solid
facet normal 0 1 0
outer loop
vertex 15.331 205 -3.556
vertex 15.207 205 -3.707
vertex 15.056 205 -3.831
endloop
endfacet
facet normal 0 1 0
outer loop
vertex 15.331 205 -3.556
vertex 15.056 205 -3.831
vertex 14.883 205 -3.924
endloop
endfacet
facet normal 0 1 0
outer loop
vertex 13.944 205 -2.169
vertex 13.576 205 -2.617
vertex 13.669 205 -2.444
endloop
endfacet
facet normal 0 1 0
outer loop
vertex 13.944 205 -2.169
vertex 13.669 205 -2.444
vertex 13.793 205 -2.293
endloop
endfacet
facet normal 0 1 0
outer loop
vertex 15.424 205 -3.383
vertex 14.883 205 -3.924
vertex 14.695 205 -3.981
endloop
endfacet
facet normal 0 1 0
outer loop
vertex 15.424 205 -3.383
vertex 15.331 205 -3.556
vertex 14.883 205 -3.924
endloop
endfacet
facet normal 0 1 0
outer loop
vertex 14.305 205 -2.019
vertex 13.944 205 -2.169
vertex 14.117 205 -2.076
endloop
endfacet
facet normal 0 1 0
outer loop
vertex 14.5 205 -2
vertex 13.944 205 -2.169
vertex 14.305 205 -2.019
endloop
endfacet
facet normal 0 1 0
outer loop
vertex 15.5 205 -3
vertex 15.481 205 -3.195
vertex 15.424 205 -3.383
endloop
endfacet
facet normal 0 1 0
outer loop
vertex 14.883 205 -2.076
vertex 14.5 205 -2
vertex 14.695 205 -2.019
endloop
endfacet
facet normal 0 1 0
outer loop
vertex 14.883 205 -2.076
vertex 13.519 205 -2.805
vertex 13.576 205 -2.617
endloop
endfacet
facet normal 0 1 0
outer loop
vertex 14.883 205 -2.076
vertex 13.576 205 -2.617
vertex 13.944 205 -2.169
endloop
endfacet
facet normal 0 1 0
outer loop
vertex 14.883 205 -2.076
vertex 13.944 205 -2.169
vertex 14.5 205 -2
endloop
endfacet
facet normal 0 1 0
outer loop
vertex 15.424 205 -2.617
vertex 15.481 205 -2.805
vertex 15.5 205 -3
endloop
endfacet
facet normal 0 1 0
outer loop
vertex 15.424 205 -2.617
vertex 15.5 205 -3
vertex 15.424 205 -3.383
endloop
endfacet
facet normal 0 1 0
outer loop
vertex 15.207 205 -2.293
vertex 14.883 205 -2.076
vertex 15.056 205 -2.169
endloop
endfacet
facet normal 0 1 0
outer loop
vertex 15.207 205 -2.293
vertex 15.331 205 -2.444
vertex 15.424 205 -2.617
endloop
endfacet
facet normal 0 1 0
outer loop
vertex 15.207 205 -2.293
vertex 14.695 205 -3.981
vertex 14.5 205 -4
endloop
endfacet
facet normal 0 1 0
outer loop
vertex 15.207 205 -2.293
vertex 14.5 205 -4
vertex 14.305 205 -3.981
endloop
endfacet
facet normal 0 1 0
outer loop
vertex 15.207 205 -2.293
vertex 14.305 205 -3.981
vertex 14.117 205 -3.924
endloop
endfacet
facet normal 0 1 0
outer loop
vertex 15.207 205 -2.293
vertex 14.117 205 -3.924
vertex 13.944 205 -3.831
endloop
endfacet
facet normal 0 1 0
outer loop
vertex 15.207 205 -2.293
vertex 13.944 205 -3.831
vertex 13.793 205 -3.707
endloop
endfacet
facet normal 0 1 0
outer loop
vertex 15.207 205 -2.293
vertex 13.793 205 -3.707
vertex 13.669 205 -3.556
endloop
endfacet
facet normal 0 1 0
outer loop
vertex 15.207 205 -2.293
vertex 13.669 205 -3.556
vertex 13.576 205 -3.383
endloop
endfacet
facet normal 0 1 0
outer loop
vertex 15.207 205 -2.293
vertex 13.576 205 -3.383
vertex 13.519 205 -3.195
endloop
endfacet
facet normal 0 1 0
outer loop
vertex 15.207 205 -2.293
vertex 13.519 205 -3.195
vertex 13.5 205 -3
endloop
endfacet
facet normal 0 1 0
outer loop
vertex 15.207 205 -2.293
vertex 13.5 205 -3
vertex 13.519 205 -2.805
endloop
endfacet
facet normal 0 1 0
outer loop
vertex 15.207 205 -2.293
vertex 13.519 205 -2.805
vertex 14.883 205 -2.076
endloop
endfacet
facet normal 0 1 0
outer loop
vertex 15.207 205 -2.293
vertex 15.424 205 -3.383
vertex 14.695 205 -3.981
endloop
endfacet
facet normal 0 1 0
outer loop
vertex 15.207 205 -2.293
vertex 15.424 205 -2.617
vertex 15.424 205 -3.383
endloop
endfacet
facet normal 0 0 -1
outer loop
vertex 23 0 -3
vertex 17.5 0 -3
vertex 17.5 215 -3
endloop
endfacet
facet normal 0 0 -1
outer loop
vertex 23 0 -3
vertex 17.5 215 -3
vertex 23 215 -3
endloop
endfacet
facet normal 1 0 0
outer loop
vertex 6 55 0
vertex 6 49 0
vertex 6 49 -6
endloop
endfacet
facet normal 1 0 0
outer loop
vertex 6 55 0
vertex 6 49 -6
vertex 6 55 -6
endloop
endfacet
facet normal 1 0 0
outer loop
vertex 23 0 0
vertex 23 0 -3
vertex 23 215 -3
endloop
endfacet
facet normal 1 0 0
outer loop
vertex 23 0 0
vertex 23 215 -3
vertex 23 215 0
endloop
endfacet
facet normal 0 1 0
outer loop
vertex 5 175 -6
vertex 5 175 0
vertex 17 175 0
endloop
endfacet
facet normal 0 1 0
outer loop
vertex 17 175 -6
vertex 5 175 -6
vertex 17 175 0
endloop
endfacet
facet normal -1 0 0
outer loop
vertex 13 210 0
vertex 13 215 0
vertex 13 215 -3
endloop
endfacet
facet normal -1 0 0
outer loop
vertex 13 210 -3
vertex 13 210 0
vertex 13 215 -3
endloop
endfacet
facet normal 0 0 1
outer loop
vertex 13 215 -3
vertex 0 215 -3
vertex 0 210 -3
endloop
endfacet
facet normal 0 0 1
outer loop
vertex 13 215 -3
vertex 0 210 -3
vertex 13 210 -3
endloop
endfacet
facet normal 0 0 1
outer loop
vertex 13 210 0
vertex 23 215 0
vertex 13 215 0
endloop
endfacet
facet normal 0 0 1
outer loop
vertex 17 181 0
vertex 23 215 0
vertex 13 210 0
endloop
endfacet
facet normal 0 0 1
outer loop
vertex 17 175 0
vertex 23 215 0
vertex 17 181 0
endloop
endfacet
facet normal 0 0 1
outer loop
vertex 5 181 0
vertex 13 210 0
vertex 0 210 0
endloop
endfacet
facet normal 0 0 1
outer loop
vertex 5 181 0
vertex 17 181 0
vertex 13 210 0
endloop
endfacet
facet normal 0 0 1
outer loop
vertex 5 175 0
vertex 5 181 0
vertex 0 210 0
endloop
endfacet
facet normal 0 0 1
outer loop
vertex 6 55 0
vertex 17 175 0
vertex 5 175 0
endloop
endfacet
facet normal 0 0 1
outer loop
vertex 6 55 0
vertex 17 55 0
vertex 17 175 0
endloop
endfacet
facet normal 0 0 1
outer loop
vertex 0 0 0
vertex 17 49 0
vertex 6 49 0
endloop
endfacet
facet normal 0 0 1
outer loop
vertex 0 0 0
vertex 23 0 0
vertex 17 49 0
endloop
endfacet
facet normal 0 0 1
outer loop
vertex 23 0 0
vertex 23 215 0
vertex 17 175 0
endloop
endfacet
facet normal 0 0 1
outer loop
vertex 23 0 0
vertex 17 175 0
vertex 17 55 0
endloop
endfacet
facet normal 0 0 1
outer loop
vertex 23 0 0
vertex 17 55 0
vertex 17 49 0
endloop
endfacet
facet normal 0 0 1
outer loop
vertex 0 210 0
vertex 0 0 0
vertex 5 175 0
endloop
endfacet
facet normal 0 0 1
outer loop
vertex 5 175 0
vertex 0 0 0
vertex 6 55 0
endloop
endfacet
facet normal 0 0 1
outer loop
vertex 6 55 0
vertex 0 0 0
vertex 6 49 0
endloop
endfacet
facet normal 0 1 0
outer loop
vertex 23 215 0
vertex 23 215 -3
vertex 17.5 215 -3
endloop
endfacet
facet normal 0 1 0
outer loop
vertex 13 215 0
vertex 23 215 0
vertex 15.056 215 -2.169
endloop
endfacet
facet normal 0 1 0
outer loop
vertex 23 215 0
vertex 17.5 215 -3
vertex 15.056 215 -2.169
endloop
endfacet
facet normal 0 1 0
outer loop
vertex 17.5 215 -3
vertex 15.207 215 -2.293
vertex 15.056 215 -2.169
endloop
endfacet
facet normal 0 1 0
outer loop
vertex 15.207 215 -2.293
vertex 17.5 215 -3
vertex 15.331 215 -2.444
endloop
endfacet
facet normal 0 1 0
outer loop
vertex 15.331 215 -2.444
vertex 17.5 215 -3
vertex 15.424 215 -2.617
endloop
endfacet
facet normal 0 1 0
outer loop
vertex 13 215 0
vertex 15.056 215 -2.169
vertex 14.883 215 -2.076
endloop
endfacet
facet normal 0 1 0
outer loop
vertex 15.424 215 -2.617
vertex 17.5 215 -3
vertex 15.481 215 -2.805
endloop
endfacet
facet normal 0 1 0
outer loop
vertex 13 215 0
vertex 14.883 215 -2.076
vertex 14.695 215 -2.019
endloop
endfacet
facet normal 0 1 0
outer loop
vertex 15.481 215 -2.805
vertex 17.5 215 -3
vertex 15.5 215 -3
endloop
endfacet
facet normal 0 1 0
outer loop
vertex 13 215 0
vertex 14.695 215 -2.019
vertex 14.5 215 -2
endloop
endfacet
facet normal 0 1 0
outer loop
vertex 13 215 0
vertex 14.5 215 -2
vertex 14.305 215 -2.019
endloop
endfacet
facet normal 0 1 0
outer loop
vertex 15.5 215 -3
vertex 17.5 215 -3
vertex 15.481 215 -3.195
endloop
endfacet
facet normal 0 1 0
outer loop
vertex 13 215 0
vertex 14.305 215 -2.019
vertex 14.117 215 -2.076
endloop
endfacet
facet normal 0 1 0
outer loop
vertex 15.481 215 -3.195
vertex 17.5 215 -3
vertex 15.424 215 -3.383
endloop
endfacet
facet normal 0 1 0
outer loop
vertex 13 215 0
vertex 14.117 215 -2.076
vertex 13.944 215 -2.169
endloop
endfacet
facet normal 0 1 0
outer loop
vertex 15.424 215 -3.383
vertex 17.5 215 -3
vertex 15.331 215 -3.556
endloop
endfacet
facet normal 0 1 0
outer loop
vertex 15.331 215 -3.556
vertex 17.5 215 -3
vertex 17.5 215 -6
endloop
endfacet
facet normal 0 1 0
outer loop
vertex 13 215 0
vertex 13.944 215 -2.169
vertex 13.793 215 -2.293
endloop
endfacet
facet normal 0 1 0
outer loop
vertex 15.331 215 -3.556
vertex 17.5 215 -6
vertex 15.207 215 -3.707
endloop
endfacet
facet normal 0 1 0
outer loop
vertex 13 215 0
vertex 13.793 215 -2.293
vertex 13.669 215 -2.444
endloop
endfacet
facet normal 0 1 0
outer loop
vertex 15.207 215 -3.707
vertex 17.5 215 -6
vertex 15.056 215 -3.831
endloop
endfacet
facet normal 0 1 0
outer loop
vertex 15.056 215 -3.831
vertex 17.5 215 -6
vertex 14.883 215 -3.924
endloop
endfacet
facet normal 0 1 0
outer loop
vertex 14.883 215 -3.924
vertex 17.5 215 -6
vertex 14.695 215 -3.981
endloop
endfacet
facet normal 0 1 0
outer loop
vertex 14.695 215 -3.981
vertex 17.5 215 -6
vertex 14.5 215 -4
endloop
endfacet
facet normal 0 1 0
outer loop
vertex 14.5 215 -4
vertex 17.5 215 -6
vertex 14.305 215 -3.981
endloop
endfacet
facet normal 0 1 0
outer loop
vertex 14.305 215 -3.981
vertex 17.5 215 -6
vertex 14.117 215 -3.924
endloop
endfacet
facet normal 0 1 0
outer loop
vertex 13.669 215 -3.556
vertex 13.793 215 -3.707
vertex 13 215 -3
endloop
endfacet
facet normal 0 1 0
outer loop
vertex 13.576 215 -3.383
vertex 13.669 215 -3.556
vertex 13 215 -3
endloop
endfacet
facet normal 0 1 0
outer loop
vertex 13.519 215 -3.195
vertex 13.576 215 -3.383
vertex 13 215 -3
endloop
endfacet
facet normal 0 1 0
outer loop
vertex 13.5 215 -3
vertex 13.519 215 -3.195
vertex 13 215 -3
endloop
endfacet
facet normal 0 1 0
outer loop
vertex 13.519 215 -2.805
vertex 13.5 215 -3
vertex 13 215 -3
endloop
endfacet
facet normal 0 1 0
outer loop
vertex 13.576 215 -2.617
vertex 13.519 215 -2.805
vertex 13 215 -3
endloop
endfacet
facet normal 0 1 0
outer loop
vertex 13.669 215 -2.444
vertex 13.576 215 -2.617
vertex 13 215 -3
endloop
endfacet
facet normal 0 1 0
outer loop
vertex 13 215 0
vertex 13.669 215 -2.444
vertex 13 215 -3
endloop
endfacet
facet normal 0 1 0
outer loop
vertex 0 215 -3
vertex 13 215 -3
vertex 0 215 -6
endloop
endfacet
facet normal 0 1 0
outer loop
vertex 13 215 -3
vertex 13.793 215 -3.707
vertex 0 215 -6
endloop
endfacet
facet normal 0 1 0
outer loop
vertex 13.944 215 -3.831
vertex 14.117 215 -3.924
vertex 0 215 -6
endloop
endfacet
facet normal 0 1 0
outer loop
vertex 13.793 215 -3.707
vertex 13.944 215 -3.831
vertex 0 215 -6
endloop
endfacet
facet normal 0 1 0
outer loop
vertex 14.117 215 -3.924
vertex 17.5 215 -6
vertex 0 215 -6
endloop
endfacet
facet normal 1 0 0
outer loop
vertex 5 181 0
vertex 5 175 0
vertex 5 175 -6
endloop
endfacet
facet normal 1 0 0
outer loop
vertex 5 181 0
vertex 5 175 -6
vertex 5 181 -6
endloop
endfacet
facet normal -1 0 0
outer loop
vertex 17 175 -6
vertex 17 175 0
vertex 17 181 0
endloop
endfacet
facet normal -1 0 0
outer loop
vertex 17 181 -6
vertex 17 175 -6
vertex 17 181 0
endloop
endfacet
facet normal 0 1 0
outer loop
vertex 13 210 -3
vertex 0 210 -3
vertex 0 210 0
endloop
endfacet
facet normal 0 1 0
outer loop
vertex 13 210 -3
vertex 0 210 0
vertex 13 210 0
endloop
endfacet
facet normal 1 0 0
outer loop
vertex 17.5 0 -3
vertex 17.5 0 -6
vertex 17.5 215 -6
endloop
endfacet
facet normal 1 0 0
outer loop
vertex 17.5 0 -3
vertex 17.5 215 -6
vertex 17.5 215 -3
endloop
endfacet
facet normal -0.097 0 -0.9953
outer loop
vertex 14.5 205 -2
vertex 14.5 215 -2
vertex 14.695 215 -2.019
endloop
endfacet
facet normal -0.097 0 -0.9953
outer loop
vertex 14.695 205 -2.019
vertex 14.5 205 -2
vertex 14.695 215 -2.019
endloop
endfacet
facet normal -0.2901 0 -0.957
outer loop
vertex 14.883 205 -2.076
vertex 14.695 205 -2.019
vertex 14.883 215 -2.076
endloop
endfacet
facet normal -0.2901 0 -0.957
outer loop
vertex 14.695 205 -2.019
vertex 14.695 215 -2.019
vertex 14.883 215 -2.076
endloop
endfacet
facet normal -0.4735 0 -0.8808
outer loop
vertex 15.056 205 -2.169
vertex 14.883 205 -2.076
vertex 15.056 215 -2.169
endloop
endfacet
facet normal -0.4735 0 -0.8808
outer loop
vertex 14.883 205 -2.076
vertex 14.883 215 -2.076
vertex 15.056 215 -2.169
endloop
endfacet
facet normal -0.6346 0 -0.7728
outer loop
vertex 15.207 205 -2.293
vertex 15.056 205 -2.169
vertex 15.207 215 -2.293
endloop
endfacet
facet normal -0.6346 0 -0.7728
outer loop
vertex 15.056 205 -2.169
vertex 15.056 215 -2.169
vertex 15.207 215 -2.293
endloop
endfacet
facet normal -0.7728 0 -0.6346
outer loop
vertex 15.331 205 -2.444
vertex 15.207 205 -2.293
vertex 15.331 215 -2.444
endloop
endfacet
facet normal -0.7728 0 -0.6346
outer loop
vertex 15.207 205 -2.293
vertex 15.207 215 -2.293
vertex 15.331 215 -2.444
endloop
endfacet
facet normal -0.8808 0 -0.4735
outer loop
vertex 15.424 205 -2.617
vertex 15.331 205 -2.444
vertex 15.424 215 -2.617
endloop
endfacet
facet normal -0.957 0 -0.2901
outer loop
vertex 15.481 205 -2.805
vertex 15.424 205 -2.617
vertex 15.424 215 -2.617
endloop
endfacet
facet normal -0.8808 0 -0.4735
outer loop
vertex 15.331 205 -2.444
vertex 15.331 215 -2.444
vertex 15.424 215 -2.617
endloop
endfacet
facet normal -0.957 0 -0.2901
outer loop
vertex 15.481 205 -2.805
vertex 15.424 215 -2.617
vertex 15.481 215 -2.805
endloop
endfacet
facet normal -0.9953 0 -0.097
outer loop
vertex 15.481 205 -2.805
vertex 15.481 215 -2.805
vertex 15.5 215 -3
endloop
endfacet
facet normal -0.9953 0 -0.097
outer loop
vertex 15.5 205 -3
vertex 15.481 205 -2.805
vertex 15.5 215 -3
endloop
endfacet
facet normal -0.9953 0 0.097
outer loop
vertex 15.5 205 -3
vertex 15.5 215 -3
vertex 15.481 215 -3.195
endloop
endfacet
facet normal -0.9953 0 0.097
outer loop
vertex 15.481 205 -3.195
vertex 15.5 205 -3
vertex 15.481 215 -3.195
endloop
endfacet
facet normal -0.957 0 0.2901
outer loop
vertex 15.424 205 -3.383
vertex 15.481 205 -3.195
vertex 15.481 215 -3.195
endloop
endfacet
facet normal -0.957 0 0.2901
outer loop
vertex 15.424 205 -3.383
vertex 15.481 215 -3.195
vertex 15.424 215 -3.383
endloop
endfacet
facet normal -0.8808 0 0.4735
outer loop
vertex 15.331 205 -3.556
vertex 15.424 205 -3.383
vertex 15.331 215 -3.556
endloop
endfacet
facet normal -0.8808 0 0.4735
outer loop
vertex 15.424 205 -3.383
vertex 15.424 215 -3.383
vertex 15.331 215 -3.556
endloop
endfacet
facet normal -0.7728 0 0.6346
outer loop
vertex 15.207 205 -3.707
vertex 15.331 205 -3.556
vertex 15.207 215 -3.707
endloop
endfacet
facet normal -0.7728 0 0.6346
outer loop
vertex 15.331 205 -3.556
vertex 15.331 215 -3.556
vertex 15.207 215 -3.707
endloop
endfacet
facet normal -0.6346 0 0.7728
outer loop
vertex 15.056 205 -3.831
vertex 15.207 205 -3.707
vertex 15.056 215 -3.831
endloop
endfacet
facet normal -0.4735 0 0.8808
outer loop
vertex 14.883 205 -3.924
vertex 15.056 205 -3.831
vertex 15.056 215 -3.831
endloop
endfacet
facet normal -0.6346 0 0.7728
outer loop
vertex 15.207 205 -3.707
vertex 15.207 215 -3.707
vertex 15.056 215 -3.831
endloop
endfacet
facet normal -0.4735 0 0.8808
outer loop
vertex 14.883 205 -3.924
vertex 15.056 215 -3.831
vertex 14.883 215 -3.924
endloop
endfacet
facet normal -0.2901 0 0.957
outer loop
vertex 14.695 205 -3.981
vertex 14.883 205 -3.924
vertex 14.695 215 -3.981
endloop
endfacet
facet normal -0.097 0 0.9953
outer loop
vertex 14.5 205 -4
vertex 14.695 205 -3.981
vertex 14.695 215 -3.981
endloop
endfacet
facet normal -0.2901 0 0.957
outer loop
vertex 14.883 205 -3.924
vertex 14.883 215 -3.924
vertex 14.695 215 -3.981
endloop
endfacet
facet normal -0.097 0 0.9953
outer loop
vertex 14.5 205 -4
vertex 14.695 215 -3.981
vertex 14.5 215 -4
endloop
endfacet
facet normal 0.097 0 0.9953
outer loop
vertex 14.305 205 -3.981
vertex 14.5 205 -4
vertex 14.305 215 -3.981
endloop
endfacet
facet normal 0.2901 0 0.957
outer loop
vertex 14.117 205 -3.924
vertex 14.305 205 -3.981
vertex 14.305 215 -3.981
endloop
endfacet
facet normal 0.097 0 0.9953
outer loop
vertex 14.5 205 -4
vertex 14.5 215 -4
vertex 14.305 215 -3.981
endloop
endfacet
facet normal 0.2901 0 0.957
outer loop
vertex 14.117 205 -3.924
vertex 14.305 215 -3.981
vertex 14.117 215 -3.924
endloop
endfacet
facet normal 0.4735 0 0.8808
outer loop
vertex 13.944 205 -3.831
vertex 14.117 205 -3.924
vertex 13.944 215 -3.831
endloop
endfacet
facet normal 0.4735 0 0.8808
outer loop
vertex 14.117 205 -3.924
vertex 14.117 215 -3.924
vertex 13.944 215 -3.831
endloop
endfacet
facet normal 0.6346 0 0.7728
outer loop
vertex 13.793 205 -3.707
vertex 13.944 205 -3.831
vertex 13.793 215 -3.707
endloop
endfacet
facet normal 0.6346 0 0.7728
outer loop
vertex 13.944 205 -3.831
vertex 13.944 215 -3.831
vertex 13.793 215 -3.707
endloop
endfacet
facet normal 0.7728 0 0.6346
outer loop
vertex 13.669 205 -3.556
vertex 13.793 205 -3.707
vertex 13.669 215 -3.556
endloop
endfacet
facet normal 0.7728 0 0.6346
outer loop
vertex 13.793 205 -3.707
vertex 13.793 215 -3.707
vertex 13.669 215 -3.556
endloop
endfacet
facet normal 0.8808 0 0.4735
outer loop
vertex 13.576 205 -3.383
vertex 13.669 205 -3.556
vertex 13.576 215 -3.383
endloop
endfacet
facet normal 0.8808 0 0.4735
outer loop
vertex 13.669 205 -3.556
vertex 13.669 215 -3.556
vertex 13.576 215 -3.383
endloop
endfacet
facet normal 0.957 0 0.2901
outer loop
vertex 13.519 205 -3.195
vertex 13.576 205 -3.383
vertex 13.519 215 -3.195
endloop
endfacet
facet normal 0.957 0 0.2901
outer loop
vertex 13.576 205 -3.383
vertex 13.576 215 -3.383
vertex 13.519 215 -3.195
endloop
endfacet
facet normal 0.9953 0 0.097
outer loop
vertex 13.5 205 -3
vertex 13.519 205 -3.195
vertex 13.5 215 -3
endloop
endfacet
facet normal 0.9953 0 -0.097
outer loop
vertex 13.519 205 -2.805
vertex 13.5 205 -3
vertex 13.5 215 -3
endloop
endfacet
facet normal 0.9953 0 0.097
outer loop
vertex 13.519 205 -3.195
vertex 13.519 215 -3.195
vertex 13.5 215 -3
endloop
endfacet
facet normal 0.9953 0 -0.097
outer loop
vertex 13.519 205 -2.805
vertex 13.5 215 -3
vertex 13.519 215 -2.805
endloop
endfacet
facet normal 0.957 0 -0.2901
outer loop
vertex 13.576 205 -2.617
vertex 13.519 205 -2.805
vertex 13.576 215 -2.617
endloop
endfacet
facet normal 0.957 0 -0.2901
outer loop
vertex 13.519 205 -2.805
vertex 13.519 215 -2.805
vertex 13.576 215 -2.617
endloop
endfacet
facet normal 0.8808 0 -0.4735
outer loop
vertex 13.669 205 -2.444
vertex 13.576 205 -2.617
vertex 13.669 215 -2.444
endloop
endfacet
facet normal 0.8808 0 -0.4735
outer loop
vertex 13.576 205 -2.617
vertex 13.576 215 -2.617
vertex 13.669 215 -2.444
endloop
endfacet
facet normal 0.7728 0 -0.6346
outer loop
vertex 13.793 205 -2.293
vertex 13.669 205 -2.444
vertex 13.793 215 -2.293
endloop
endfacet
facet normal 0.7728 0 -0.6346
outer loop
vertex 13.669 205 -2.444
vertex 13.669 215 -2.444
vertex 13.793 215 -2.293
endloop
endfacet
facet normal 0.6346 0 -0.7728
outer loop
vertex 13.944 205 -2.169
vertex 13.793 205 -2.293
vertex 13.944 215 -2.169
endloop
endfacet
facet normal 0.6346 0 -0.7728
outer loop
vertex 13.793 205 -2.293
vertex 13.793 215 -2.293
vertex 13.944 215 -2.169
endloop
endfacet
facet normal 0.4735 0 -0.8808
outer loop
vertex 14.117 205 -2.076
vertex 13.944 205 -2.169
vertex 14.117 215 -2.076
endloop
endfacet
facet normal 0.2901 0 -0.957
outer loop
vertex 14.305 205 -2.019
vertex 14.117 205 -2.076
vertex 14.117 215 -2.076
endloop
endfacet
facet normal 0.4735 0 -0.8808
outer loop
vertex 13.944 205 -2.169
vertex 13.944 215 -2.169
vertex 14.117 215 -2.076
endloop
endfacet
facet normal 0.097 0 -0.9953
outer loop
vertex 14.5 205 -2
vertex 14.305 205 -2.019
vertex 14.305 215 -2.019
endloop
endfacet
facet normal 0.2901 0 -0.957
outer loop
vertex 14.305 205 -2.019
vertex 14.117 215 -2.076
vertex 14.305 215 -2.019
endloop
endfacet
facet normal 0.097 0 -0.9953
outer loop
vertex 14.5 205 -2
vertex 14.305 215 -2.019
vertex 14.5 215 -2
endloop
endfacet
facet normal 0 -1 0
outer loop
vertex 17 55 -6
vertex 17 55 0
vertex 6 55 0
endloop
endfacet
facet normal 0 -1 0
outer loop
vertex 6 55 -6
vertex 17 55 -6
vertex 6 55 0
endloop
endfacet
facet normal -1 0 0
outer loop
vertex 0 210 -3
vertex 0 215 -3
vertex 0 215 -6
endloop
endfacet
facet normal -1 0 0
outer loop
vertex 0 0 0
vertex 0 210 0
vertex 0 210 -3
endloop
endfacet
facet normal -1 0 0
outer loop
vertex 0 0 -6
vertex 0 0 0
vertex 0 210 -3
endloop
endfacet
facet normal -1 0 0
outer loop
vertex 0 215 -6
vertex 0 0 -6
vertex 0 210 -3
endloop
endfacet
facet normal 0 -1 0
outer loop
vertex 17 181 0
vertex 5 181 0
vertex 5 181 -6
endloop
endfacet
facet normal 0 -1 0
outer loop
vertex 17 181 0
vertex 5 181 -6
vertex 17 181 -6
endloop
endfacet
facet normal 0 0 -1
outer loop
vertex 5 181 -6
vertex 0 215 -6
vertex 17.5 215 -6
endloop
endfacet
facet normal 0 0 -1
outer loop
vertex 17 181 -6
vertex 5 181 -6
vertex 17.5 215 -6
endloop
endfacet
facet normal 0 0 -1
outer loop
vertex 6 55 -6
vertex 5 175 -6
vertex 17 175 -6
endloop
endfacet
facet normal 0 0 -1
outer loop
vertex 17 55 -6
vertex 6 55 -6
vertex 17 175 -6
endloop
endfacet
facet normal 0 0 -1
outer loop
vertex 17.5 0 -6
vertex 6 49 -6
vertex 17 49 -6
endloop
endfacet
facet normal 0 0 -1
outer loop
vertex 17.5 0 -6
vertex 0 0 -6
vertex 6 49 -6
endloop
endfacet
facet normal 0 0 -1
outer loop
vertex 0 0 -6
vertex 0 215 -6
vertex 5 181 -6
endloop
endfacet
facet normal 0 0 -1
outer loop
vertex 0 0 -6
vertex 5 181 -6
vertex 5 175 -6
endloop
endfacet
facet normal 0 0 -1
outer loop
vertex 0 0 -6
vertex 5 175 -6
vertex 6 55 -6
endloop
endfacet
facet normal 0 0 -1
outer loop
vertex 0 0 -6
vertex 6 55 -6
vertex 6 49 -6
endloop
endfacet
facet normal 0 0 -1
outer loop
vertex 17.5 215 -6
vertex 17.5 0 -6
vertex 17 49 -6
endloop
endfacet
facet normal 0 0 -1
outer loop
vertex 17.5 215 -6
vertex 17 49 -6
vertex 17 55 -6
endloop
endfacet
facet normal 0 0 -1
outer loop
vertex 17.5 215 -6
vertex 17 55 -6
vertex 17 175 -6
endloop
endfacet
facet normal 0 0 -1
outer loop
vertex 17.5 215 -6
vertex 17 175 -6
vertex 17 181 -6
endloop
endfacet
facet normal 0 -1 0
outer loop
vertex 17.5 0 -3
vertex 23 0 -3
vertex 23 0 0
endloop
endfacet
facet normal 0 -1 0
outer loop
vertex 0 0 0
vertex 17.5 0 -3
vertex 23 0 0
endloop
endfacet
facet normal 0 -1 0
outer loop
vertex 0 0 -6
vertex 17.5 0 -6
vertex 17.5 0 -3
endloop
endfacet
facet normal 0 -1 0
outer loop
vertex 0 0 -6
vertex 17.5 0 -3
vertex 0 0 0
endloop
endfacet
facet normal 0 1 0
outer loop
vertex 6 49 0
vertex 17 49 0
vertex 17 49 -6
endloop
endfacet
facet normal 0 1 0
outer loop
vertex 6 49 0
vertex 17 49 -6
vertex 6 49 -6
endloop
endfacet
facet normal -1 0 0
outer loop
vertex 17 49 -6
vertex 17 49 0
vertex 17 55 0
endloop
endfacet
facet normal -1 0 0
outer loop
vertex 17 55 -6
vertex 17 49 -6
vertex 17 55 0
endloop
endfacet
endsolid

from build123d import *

# Parameters (mm, degrees)
BOSS_EXTRU_1_DEPTH           = 215
ESQUISSE2_W                  = 13
ESQUISSE2_H                  = 3
ENL_V_MAT_EXTRU_1_DEPTH      = 5
ESQUISSE3_W                  = 12
ESQUISSE3_H                  = 6
ENL_V_MAT_EXTRU_2_DEPTH      = 217.309962785
ESQUISSE4_R                  = 1
ENL_V_MAT_EXTRU_3_DEPTH      = 10
ENL_V_MAT_EXTRU_4_DEPTH      = 217.309962785
ENL_V_MAT_EXTRU_4_DEPTH_BACK = 217.309962785
ESQUISSE5_W                  = 11
ESQUISSE5_H                  = 6


with BuildPart() as part:
    # Esquisse1 → Boss.-Extru.1 (new body)
    with BuildSketch(Plane(origin=(0, 0, 0), x_dir=(1, 0, 0), z_dir=(0, 1, 0))):
        Polygon((0, 0), (0, 6), (17.5, 6), (17.5, 3), (23, 3), (23, 0), align=None)
    extrude(amount=BOSS_EXTRU_1_DEPTH)

    # Esquisse2 → Enlèv. mat.-Extru.1 (cut)
    with BuildSketch(Plane(origin=(0, 215, 0), x_dir=(1, 0, 0), z_dir=(0, 1, 0))):
        with Locations((6.5, 1.5)):
            Rectangle(ESQUISSE2_W, ESQUISSE2_H)
    extrude(amount=-ENL_V_MAT_EXTRU_1_DEPTH, mode=Mode.SUBTRACT)

    # Esquisse3 → Enlèv. mat.-Extru.2 (cut, through all)
    with BuildSketch(Plane.XY):
        with Locations((11, 178)):
            Rectangle(ESQUISSE3_W, ESQUISSE3_H)
    extrude(amount=-ENL_V_MAT_EXTRU_2_DEPTH, mode=Mode.SUBTRACT)

    # Esquisse4 → Enlèv. mat.-Extru.3 (cut)
    with BuildSketch(Plane(origin=(0, 215, 0), x_dir=(1, 0, 0), z_dir=(0, 1, 0))):
        with Locations(Location((14.5, 3, 0), (0, 0, 270))):
            Circle(ESQUISSE4_R)
    extrude(amount=-ENL_V_MAT_EXTRU_3_DEPTH, mode=Mode.SUBTRACT)

    # Esquisse5 → Enlèv. mat.-Extru.4 (cut, two sides: drawn at the far end of the back side and taken through both)
    with BuildSketch(Plane(origin=(0, 0, -6), x_dir=(-1, 0, 0), z_dir=(0, 0, -1)).offset(-ENL_V_MAT_EXTRU_4_DEPTH_BACK)):
        with Locations((-11.5, 52)):
            Rectangle(ESQUISSE5_W, ESQUISSE5_H)
    extrude(amount=ENL_V_MAT_EXTRU_4_DEPTH + ENL_V_MAT_EXTRU_4_DEPTH_BACK, mode=Mode.SUBTRACT)


solid = part.part
